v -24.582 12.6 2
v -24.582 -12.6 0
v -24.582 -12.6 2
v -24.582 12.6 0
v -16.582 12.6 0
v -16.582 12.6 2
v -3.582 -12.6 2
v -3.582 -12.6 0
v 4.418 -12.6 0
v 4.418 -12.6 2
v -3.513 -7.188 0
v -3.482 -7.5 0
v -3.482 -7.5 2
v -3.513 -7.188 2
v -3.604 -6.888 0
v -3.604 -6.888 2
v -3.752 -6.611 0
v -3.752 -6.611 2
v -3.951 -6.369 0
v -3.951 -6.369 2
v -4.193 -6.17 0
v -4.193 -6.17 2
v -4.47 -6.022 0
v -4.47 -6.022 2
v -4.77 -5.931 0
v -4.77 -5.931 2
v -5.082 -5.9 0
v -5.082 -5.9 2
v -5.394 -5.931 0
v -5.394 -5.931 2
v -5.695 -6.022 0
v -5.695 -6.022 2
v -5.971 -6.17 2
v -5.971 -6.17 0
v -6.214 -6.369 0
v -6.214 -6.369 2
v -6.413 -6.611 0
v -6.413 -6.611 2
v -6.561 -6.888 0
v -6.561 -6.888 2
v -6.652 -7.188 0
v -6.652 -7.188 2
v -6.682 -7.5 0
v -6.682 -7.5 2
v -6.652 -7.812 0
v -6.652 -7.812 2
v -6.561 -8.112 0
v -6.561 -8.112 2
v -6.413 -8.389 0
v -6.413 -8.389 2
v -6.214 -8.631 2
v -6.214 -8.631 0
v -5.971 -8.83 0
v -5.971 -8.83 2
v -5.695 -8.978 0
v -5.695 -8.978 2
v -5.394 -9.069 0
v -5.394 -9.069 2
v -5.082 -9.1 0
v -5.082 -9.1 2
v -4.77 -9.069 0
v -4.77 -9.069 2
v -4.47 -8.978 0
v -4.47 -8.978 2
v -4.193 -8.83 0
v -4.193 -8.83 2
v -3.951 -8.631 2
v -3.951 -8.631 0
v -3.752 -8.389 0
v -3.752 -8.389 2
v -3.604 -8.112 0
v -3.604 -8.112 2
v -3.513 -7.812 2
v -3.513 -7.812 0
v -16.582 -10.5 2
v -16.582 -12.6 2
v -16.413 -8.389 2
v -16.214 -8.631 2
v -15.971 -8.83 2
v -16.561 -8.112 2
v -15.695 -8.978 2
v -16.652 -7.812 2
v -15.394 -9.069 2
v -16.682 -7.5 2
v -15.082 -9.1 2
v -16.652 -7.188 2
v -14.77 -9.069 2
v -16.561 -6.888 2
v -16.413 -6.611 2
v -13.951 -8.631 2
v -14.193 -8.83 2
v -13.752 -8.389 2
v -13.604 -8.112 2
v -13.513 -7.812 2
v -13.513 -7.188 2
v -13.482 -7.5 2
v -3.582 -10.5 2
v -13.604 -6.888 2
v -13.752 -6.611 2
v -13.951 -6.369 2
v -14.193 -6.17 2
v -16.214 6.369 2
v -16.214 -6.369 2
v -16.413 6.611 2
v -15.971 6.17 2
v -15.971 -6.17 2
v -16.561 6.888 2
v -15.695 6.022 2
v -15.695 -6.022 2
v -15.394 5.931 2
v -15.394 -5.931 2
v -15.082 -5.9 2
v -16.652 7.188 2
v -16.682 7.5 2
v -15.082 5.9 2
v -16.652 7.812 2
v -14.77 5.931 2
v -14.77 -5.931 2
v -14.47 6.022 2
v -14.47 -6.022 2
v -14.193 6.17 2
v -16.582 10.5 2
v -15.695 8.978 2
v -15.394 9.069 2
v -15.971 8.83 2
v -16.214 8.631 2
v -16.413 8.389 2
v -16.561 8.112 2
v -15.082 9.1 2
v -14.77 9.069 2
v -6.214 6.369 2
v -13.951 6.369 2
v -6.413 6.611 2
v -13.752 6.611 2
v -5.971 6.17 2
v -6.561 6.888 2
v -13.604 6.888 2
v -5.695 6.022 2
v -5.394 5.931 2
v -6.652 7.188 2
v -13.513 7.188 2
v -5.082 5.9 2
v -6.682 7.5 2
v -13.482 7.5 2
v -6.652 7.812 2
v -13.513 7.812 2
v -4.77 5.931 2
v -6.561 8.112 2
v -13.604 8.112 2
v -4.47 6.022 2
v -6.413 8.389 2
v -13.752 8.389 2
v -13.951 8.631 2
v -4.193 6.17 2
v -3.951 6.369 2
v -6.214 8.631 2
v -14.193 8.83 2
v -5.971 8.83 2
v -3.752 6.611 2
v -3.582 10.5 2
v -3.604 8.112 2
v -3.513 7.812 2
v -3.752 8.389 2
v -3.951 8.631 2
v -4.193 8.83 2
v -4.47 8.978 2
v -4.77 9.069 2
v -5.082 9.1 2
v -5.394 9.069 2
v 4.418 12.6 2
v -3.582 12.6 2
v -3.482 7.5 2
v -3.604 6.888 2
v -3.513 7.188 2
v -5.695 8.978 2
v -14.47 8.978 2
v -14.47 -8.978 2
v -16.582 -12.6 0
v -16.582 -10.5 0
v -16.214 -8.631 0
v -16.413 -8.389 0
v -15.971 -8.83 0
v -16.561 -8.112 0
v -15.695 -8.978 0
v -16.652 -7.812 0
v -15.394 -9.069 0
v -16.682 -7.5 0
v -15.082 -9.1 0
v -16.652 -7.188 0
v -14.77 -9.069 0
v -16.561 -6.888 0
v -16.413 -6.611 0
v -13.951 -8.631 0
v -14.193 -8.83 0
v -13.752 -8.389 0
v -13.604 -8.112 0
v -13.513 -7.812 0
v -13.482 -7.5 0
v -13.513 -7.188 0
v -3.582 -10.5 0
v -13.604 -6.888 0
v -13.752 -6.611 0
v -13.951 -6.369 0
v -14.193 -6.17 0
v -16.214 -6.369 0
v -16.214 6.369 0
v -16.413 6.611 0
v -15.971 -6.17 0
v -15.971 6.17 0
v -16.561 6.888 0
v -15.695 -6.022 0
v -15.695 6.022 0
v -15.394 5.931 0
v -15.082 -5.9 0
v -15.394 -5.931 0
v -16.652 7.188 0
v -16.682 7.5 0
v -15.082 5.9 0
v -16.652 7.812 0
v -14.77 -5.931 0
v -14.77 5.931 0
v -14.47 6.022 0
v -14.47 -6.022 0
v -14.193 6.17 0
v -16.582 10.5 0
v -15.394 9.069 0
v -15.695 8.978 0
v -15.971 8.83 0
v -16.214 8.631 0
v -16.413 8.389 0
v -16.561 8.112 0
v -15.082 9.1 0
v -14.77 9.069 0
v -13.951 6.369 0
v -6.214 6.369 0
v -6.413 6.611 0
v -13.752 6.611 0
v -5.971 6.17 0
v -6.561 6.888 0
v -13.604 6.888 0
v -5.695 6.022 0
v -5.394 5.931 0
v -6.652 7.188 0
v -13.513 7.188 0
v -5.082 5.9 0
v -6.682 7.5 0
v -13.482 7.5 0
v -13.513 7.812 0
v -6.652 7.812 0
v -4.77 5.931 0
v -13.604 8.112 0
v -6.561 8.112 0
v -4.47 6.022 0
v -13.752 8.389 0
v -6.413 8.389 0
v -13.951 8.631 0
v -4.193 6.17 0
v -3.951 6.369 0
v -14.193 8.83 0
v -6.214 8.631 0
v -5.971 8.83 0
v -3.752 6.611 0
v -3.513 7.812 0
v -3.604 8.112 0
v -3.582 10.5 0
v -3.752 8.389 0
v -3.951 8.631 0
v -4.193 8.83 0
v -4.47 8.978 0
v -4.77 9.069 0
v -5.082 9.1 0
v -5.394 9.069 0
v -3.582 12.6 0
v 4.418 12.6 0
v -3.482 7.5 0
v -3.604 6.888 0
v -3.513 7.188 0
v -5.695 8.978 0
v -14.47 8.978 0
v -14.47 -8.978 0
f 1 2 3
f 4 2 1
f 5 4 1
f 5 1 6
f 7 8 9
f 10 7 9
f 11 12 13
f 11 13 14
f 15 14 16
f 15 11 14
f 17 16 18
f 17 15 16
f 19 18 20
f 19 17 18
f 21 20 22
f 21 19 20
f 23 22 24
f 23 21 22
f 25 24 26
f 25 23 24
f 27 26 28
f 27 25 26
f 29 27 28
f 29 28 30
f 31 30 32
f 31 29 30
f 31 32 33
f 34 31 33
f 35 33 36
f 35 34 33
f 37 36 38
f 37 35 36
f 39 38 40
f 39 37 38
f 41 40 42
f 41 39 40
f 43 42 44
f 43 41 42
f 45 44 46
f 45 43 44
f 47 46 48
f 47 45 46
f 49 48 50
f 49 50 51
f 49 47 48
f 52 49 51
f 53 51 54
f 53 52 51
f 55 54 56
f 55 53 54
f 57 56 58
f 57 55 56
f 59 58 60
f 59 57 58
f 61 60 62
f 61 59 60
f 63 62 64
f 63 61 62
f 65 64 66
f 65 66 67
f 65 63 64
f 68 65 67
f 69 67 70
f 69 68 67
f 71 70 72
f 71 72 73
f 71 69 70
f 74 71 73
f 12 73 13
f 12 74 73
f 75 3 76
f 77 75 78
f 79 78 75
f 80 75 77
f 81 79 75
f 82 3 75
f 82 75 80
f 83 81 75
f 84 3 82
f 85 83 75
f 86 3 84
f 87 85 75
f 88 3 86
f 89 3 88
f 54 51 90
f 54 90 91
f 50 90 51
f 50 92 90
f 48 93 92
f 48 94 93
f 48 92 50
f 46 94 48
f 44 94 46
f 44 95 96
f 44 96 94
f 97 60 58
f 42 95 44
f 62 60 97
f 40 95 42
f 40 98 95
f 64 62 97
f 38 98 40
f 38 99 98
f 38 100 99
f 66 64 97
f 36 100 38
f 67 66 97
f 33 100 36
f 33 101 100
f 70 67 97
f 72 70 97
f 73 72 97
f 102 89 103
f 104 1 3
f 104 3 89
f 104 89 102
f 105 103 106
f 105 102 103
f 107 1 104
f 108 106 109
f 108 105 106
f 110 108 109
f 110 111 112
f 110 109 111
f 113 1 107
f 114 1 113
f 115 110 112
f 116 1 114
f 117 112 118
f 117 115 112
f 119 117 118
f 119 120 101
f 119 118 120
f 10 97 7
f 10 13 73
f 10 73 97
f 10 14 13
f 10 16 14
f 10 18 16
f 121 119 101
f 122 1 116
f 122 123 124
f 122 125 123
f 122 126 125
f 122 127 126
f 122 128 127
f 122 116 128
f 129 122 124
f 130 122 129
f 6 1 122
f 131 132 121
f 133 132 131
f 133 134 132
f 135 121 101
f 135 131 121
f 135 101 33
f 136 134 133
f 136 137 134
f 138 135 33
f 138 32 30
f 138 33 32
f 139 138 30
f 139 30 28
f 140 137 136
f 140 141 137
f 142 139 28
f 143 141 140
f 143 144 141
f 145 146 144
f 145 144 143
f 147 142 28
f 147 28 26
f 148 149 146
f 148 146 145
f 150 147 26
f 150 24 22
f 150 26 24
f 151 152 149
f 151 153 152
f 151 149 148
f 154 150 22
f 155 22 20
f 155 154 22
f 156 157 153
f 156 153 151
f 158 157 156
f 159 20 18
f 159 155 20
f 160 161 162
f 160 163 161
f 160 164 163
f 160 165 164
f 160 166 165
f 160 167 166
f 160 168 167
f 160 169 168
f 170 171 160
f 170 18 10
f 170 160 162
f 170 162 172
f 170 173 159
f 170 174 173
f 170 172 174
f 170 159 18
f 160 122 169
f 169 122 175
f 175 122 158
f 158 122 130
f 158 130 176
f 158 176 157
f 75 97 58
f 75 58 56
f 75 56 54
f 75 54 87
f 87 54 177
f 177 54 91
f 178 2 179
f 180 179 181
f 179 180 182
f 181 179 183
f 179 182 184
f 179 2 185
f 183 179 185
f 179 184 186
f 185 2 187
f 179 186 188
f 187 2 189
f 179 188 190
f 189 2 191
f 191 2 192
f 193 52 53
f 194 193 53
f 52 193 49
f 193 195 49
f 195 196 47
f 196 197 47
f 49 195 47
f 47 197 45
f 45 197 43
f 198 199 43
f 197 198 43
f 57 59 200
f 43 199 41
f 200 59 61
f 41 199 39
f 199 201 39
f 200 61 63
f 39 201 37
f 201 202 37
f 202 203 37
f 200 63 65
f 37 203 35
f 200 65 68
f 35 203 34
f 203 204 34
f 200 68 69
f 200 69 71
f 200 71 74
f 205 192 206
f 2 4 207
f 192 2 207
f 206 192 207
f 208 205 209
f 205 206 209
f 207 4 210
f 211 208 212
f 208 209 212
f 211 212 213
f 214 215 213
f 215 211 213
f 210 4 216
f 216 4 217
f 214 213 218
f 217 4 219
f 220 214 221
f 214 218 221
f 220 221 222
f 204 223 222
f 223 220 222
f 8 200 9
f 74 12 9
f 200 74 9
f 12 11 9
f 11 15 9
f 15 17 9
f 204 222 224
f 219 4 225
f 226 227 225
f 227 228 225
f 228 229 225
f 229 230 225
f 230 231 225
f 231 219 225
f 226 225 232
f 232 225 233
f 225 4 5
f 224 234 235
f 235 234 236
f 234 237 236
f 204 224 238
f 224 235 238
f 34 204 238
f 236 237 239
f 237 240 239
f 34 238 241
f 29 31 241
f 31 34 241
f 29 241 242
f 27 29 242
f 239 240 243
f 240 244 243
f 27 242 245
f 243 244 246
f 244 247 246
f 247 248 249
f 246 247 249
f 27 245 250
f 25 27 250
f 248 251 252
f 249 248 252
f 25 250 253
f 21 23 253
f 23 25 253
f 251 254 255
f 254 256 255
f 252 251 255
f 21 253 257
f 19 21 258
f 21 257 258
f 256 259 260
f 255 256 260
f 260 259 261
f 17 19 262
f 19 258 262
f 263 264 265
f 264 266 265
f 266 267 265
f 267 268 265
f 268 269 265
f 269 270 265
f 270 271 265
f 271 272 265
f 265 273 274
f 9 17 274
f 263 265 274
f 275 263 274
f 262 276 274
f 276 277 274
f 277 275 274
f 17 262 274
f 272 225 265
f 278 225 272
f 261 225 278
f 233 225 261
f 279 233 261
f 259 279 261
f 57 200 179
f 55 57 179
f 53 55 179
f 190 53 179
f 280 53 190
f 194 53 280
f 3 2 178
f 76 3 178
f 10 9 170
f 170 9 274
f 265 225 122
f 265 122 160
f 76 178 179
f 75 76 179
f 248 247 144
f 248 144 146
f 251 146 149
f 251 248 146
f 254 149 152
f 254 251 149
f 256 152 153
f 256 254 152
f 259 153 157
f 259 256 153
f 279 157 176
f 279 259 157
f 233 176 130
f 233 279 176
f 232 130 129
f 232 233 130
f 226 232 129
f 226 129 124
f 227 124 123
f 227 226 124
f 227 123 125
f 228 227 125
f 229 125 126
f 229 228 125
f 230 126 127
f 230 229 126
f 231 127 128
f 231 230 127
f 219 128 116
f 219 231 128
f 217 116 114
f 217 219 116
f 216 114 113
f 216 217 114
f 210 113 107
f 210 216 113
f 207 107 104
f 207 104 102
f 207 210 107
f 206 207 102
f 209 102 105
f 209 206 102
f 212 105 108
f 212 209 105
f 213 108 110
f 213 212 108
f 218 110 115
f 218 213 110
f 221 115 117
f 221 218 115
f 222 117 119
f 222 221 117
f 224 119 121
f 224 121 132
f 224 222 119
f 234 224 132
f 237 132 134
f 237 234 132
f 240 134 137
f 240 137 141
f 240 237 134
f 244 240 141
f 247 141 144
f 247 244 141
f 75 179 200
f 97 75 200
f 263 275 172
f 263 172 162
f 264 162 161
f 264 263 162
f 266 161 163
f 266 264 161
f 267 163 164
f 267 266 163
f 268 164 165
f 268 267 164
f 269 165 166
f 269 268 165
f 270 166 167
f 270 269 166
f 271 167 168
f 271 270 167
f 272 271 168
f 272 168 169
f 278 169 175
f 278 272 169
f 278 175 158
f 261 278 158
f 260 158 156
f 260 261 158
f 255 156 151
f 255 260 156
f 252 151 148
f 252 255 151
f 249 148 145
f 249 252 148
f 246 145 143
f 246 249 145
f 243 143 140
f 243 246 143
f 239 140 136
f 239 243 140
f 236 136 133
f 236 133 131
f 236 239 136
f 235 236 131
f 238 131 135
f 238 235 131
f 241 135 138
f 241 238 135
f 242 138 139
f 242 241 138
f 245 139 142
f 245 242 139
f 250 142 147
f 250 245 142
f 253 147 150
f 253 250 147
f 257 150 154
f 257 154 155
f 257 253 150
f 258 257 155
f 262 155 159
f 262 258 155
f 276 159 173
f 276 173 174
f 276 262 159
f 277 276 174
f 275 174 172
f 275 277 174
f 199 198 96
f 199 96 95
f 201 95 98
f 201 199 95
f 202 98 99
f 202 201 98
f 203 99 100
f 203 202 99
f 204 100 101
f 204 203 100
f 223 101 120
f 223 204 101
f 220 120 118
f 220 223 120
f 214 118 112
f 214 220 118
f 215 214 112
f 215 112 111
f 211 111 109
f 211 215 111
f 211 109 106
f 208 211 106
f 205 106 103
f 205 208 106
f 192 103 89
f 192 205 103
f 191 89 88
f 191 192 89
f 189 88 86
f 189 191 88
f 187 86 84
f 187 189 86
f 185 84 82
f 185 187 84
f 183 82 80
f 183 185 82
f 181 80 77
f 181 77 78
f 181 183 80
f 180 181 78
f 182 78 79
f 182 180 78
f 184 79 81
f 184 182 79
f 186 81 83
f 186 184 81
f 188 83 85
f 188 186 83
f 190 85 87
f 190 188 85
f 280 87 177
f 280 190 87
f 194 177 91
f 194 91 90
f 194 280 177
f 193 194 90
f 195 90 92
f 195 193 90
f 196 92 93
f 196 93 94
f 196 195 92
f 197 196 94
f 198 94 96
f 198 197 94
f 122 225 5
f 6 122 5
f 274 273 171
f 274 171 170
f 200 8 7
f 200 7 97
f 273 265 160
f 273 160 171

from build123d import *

# Parameters (mm, degrees)
SKETCH_1_W      = 29
SKETCH_1_H      = 21
SKETCH_1_R      = 1.6
SKETCH_1_W_2    = 8
SKETCH_1_H_2    = 2.1
EXTRUDE_1_DEPTH = 2


with BuildPart() as part:
    # 草图1 → 凸台-拉伸1 (new body)
    # profile 1 of 5: a face of its own
    with BuildSketch(Plane.XY):
        with Locations((-10.082297853, 0)):
            Rectangle(SKETCH_1_W, SKETCH_1_H)
        with Locations((-15.082297853, 7.5)):
            Circle(SKETCH_1_R, mode=Mode.SUBTRACT)
        with Locations((-5.082297853, 7.5)):
            Circle(SKETCH_1_R, mode=Mode.SUBTRACT)
        with Locations((-15.082297853, -7.5)):
            Circle(SKETCH_1_R, mode=Mode.SUBTRACT)
        with Locations((-5.082297853, -7.5)):
            Circle(SKETCH_1_R, mode=Mode.SUBTRACT)
    # profile 2 of 5: a face of its own
    with BuildSketch(Plane.XY):
        with Locations((-20.582297853, 11.55)):
            Rectangle(SKETCH_1_W_2, SKETCH_1_H_2)
    # profile 3 of 5: a face of its own
    with BuildSketch(Plane.XY):
        with Locations((0.417702147, 11.55)):
            Rectangle(SKETCH_1_W_2, SKETCH_1_H_2)
    # profile 4 of 5: a face of its own
    with BuildSketch(Plane.XY):
        with Locations((-20.582297853, -11.55)):
            Rectangle(SKETCH_1_W_2, SKETCH_1_H_2)
    # profile 5 of 5: a face of its own
    with BuildSketch(Plane.XY):
        with Locations((0.417702147, -11.55)):
            Rectangle(SKETCH_1_W_2, SKETCH_1_H_2)
    extrude(amount=EXTRUDE_1_DEPTH)


solid = part.part
